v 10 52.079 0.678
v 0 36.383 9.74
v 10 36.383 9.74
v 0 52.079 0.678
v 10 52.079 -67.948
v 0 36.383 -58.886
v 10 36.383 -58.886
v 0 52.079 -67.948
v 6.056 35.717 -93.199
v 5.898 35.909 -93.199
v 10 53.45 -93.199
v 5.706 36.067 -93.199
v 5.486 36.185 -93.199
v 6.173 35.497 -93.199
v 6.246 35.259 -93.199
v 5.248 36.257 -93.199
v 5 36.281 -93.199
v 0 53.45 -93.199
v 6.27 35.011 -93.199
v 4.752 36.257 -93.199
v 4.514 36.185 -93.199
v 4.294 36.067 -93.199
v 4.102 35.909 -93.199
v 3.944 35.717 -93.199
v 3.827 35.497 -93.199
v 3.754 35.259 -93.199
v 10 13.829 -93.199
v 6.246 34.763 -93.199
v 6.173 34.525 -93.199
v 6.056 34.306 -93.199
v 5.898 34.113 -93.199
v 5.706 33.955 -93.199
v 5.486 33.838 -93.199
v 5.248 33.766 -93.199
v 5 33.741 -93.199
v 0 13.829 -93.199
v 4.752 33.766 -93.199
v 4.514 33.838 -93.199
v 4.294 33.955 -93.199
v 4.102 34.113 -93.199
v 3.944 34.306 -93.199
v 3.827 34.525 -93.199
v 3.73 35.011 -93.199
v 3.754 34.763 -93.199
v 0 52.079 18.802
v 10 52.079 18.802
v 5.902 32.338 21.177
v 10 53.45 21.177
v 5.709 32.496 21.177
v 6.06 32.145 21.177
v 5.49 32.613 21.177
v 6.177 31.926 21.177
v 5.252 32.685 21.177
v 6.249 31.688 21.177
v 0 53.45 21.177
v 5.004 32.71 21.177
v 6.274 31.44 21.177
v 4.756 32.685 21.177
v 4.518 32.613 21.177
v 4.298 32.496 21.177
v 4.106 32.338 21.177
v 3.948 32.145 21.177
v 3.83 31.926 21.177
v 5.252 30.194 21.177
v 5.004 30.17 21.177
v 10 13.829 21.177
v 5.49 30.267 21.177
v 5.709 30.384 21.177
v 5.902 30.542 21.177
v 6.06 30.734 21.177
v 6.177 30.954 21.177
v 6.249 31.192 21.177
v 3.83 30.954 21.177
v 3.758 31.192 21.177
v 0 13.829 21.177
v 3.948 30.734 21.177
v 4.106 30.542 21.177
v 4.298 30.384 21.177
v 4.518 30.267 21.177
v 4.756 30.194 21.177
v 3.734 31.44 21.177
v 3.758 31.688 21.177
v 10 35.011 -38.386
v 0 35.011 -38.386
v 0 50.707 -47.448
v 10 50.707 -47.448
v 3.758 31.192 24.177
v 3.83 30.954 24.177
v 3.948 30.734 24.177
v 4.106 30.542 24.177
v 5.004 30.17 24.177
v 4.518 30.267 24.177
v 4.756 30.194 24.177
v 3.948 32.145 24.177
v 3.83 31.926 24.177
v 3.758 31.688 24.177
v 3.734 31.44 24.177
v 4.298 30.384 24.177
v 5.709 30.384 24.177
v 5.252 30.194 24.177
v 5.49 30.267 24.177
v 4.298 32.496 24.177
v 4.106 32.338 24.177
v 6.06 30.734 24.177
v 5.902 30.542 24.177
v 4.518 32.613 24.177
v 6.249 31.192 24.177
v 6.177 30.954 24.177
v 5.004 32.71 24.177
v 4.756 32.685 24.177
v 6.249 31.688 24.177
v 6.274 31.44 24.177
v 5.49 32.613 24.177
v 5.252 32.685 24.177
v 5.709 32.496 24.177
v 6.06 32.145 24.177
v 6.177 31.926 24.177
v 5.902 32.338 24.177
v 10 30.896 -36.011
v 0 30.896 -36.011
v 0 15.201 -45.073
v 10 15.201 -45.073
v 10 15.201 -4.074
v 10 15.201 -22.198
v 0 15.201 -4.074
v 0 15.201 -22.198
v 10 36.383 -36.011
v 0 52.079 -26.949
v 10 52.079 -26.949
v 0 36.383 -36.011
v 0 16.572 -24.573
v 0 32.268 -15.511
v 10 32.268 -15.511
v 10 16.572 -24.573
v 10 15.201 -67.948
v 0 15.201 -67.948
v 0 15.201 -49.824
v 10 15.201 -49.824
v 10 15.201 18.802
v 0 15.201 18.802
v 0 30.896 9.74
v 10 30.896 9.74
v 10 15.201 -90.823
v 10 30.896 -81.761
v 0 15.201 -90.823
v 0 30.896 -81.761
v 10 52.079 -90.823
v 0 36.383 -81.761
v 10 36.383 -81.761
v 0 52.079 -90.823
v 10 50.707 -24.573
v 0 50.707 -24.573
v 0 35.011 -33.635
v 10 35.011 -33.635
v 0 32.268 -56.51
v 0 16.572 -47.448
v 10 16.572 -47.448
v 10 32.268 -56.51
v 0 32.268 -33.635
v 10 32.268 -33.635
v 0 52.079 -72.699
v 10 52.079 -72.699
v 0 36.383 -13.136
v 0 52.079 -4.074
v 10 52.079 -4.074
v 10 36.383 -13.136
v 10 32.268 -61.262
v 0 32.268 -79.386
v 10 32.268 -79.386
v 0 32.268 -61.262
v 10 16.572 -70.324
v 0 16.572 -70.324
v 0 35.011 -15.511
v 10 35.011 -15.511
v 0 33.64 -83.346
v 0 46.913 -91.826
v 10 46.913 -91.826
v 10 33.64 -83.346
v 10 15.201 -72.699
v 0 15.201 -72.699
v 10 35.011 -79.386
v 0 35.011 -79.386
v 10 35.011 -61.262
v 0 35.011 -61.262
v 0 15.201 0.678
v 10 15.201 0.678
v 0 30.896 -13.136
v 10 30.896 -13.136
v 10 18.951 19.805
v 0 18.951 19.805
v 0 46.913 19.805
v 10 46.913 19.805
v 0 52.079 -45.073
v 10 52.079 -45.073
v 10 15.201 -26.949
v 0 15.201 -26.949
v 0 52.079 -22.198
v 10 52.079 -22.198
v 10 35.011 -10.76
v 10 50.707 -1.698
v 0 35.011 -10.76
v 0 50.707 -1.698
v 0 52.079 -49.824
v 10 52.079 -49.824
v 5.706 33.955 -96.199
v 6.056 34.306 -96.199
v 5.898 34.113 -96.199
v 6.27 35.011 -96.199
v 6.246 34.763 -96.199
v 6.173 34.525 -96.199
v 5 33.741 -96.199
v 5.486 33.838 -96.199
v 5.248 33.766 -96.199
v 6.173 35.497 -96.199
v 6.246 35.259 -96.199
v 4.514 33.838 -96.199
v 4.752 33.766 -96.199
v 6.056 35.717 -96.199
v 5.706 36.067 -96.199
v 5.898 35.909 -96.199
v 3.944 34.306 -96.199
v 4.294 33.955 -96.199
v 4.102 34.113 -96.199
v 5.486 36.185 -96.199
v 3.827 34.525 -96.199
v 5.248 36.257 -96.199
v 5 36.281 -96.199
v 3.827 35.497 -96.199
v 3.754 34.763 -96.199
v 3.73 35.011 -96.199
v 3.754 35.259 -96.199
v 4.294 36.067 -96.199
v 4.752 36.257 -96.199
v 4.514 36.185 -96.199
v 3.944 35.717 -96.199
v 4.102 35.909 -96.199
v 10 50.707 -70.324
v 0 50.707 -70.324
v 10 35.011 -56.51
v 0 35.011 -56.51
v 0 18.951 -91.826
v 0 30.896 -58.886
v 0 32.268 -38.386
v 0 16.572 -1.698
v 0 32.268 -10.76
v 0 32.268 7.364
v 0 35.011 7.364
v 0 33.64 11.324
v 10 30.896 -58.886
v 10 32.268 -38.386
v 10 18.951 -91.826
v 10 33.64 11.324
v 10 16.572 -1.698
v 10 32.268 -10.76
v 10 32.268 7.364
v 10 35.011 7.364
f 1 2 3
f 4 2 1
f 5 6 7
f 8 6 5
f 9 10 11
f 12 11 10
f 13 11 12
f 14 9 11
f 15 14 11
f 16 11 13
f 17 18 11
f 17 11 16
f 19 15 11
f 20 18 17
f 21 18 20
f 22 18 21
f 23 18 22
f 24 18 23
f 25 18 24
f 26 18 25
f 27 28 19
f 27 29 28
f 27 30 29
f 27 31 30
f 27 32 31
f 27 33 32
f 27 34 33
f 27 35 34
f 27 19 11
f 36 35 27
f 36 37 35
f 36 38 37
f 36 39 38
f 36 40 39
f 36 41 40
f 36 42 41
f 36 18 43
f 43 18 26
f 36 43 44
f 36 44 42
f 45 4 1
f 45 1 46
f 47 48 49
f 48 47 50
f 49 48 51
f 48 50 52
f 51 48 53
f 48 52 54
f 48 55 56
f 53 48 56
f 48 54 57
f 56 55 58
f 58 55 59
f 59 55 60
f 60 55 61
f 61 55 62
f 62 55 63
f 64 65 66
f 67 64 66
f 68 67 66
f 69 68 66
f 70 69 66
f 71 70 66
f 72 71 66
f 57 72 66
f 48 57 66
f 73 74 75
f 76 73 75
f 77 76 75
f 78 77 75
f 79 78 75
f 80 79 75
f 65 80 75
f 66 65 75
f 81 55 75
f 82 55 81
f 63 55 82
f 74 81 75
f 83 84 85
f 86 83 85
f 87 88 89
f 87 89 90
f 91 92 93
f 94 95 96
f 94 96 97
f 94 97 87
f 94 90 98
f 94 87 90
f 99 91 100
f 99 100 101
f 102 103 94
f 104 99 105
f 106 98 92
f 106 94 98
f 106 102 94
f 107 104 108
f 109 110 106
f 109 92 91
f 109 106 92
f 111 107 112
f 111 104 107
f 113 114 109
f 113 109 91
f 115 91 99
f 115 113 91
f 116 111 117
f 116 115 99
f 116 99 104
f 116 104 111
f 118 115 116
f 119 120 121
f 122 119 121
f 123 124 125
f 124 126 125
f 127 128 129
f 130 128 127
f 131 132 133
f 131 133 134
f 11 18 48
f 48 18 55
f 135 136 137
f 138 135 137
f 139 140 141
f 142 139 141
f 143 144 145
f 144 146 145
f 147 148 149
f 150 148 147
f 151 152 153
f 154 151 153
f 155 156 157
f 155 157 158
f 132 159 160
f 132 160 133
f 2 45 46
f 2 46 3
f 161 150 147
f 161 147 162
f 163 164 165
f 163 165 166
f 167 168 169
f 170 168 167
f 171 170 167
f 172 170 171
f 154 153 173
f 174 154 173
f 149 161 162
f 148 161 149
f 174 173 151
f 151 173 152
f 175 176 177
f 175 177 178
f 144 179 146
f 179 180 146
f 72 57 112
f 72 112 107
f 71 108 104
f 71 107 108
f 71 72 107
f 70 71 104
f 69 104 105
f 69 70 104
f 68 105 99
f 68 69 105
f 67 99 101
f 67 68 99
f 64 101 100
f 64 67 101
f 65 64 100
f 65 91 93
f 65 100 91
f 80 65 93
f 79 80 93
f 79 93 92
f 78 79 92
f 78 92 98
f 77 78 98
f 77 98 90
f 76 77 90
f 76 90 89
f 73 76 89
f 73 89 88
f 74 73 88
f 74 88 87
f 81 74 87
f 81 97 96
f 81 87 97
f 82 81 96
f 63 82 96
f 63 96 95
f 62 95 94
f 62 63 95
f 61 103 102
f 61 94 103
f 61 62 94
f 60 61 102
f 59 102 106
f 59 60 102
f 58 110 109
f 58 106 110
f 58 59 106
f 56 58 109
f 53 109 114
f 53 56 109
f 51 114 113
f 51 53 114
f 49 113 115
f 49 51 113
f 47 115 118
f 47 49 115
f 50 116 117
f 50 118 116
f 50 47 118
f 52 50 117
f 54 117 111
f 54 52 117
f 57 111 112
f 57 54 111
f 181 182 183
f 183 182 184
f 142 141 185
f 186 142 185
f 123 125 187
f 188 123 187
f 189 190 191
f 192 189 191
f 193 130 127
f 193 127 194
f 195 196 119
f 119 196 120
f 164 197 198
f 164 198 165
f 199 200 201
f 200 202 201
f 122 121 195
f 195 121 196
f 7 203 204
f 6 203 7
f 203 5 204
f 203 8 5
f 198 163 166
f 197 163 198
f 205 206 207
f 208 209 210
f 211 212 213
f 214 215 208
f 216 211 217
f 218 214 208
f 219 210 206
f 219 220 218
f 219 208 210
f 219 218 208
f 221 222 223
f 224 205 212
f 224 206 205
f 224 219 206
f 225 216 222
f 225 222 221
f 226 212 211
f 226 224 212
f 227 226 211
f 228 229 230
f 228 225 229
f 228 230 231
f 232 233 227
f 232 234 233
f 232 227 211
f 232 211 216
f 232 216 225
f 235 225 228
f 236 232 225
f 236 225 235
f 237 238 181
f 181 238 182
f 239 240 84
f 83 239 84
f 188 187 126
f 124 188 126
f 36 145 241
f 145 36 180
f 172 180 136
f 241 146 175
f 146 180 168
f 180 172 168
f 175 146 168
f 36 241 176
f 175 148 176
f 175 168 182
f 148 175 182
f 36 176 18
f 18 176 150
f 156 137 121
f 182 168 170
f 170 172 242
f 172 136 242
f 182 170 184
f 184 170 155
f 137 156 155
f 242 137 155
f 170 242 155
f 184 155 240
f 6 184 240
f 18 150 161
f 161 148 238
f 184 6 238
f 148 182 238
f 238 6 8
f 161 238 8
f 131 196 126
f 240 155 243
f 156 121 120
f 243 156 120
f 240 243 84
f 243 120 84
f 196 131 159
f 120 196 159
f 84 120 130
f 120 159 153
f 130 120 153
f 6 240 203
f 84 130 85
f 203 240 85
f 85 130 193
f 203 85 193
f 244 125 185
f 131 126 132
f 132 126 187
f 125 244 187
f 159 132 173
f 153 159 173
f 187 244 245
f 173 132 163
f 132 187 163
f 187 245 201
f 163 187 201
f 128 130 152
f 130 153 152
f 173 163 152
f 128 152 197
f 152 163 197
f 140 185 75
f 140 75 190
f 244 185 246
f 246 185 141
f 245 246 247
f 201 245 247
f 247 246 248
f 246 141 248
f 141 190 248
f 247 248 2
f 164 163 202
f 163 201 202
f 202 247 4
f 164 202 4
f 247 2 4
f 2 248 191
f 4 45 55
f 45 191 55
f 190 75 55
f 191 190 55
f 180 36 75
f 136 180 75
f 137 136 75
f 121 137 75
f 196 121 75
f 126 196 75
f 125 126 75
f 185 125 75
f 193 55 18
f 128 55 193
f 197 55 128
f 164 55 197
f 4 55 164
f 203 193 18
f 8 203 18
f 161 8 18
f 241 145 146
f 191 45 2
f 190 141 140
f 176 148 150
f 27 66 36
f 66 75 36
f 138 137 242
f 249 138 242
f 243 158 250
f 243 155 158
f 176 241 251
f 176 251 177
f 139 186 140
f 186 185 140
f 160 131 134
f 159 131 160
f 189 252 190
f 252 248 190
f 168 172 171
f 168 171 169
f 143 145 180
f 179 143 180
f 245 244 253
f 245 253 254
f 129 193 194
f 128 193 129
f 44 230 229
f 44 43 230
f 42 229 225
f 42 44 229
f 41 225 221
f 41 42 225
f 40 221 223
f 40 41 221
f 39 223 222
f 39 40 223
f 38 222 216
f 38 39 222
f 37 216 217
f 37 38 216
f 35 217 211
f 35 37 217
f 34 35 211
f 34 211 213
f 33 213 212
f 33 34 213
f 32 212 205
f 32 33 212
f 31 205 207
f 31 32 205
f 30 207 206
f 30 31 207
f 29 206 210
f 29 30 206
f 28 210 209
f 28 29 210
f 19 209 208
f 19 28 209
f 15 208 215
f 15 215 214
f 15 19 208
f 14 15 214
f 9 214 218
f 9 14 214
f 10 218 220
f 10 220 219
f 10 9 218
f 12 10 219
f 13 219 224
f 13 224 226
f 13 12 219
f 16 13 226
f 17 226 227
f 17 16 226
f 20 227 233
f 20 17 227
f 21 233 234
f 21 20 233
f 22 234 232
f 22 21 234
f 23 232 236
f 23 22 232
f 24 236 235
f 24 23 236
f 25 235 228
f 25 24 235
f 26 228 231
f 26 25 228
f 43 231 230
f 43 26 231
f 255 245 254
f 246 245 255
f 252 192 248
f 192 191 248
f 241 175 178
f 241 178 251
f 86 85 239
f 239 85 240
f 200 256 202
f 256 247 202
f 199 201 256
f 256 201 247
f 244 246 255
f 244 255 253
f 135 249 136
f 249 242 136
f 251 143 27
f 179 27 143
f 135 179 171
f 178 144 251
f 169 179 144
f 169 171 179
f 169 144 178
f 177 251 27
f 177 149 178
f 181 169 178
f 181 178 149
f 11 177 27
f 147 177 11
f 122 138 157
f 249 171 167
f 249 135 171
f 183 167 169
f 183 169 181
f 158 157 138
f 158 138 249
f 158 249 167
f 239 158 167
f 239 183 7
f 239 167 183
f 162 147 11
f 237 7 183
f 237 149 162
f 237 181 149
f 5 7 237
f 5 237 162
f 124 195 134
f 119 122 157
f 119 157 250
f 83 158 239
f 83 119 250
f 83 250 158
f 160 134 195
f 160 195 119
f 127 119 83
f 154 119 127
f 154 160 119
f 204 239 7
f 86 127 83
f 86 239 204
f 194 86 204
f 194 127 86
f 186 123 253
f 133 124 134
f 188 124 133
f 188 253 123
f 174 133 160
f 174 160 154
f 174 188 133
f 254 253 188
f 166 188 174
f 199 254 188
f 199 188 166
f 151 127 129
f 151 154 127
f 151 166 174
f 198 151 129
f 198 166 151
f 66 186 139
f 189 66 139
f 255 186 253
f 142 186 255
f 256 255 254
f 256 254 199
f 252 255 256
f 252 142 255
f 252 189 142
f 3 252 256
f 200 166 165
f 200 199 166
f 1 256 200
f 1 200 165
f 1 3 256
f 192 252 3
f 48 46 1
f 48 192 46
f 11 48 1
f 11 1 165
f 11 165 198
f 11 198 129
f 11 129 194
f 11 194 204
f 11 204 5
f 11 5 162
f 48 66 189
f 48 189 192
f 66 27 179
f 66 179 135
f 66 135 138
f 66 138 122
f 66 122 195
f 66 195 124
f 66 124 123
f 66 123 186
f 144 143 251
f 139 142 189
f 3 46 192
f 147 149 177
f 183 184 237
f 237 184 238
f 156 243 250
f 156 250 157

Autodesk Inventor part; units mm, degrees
ref_plane "YZ Plane" through (0, 0, 0) normal (1, 0, 0) x (0, 1, 0)
ref_plane "XZ Plane" through (0, 0, 0) normal (0, 1, 0) x (-1, 0, 0)
ref_plane "XY Plane" through (0, 0, 0) normal (0, 0, 1) x (1, 0, 0)
sketch "Sketch1" plane through (0, 0, 0) normal (1, 0, 0) x (0, 1, 0)
  line L0 (33.6396, 9.7397) -> (33.6396, -13.1356)
  line L1 (33.6396, -13.1356) -> (53.4502, -1.698)
  line L2 (53.4502, -1.698) -> (33.6396, 9.7397)
  line L3 (50.707, -1.698) -> (35.0112, -10.7599)
  line L4 (35.0112, -10.7599) -> (35.0112, 7.364)
  line L5 (35.0112, 7.364) -> (50.707, -1.698)
  line L6 (53.4502, -1.698) -> (33.6396, -13.1356)
  line L7 (53.4502, -24.5732) -> (33.6396, -13.1356)
  line L8 (53.4502, -1.698) -> (53.4502, -24.5732)
  line L9 (52.0786, -4.0736) -> (36.3828, -13.1356)
  line L10 (36.3828, -13.1356) -> (52.0786, -22.1975)
  line L11 (52.0786, -22.1975) -> (52.0786, -4.0736)
  line L12 (33.6396, -13.1356) -> (33.6396, -36.0108)
  line L13 (33.6396, -36.0108) -> (53.4502, -24.5732)
  line L14 (35.0112, -33.6351) -> (35.0112, -15.5113)
  line L15 (35.0112, -15.5113) -> (50.707, -24.5732)
  line L16 (50.707, -24.5732) -> (35.0112, -33.6351)
  line L17 (53.4502, -24.5732) -> (53.4502, -47.4484)
  line L18 (53.4502, -47.4484) -> (33.6396, -36.0108)
  line L19 (52.0786, -45.0728) -> (52.0786, -26.9489)
  line L20 (36.3828, -36.0108) -> (52.0786, -45.0728)
  line L21 (52.0786, -26.9489) -> (36.3828, -36.0108)
  line L22 (33.6396, -36.0108) -> (33.6396, -58.8861)
  line L23 (35.0112, -56.5104) -> (35.0112, -38.3865)
  line L24 (33.6396, -58.8861) -> (53.4502, -47.4484)
  line L25 (50.707, -47.4484) -> (35.0112, -56.5104)
  line L26 (35.0112, -38.3865) -> (50.707, -47.4484)
  line L27 (53.4502, -47.4484) -> (53.4502, -70.3237)
  line L28 (52.0786, -49.8241) -> (36.3828, -58.8861)
  line L29 (36.3828, -58.8861) -> (52.0786, -67.948)
  line L30 (53.4502, -70.3237) -> (33.6396, -58.8861)
  line L31 (52.0786, -67.948) -> (52.0786, -49.8241)
  line L32 (33.6396, -58.8861) -> (33.6396, -81.7613)
  line L33 (33.6396, -81.7613) -> (53.4502, -70.3237)
  line L34 (50.707, -70.3237) -> (35.0112, -79.3856)
  line L35 (35.0112, -79.3856) -> (35.0112, -61.2617)
  line L36 (35.0112, -61.2617) -> (50.707, -70.3237)
  line L37 (33.6396, -13.1356) -> (13.8291, -1.698)
  line L38 (13.8291, -1.698) -> (33.6396, 9.7397)
  line L39 (16.5723, -1.698) -> (32.268, -10.7599)
  line L40 (32.268, -10.7599) -> (32.268, 7.364)
  line L41 (32.268, 7.364) -> (16.5723, -1.698)
  line L42 (33.6396, -13.1356) -> (13.8291, -1.698)
  line L43 (13.8291, -24.5732) -> (33.6396, -13.1356)
  line L44 (13.8291, -1.698) -> (13.8291, -24.5732)
  line L45 (15.2007, -4.0736) -> (30.8964, -13.1356)
  line L46 (30.8964, -13.1356) -> (15.2007, -22.1975)
  line L47 (15.2007, -22.1975) -> (15.2007, -4.0736)
  line L48 (13.8291, -24.5732) -> (33.6396, -13.1356)
  line L49 (33.6396, -36.0108) -> (13.8291, -24.5732)
  line L50 (32.268, -15.5113) -> (16.5723, -24.5732)
  line L51 (32.268, -33.6351) -> (32.268, -15.5113)
  line L52 (16.5723, -24.5732) -> (32.268, -33.6351)
  line L53 (13.8291, -47.4484) -> (33.6396, -36.0108)
  line L54 (16.5723, -47.4484) -> (32.268, -56.5104)
  line L55 (32.268, -56.5104) -> (32.268, -38.3865)
  line L56 (33.6396, -58.8861) -> (13.8291, -47.4484)
  line L57 (32.268, -38.3865) -> (16.5723, -47.4484)
  line L58 (33.6396, -36.0108) -> (13.8291, -24.5732)
  line L59 (15.2007, -26.9489) -> (30.8964, -36.0108)
  line L60 (13.8291, -24.5732) -> (13.8291, -47.4484)
  line L61 (15.2007, -45.0728) -> (15.2007, -26.9489)
  line L62 (13.8291, -47.4484) -> (33.6396, -36.0108)
  line L63 (30.8964, -36.0108) -> (15.2007, -45.0728)
  line L64 (13.8291, -70.3237) -> (33.6396, -58.8861)
  line L65 (32.268, -79.3856) -> (32.268, -61.2617)
  line L66 (33.6396, -81.7613) -> (13.8291, -70.3237)
  line L67 (32.268, -61.2617) -> (16.5723, -70.3237)
  line L68 (16.5723, -70.3237) -> (32.268, -79.3856)
  line L69 (33.6396, -58.8861) -> (13.8291, -47.4484)
  line L70 (13.8291, -47.4484) -> (13.8291, -70.3237)
  line L71 (15.2007, -67.948) -> (15.2007, -49.8241)
  line L72 (15.2007, -49.8241) -> (30.8964, -58.8861)
  line L73 (13.8291, -70.3237) -> (33.6396, -58.8861)
  line L74 (30.8964, -58.8861) -> (15.2007, -67.948)
  line L75 (13.8291, -1.698) -> (13.8291, 21.1773)
  line L76 (13.8291, 21.1773) -> (33.6396, 9.7397)
  line L77 (53.4502, -1.698) -> (53.4502, 21.1773)
  line L78 (53.4502, 21.1773) -> (33.6396, 9.7397)
  line L79 (53.4502, 21.1773) -> (13.8291, 21.1773)
  line L80 (53.4502, -70.3237) -> (53.4502, -93.1989)
  line L81 (53.4502, -93.1989) -> (33.6396, -81.7613)
  line L82 (13.8291, -70.3237) -> (13.8291, -93.1989)
  line L83 (13.8291, -93.1989) -> (33.6396, -81.7613)
  line L84 (53.4502, -93.1989) -> (13.8291, -93.1989)
  line L85 (15.2007, 0.6777) -> (15.2007, 18.8016)
  line L86 (30.8964, 9.7397) -> (15.2007, 0.6777)
  line L87 (15.2007, 18.8016) -> (30.8964, 9.7397)
  line L88 (52.0786, 0.6777) -> (52.0786, 18.8016)
  line L89 (52.0786, 18.8016) -> (36.3828, 9.7397)
  line L90 (36.3828, 9.7397) -> (52.0786, 0.6777)
  line L91 (36.3828, -81.7613) -> (52.0786, -90.8232)
  line L92 (52.0786, -90.8232) -> (52.0786, -72.6994)
  line L93 (52.0786, -72.6994) -> (36.3828, -81.7613)
  line L94 (30.8964, -81.7613) -> (15.2007, -90.8232)
  line L95 (15.2007, -90.8232) -> (15.2007, -72.6994)
  line L96 (15.2007, -72.6994) -> (30.8964, -81.7613)
  line L97 (35.8485, 19.8048) -> (46.9126, 19.8048)
  line L98 (46.9126, 19.8048) -> (33.6396, 11.3245)
  line L99 (33.6396, 11.3245) -> (18.9514, 19.8048)
  line L100 (18.9514, 19.8048) -> (35.8485, 19.8048)
  line L101 (35.8485, -91.8264) -> (46.9126, -91.8264)
  line L102 (46.9126, -91.8264) -> (33.6396, -83.3461)
  line L103 (33.6396, -83.3461) -> (18.9514, -91.8264)
  line L104 (18.9514, -91.8264) -> (35.8485, -91.8264)
  dimension "d13" = 1.3716
extrude "Extrusion1" add sketch "Sketch1" along normal blind 10
sketch "Sketch2" plane through (0, 13.8291, 21.1773) normal (0, 0, 1) x (1, 0, 0)
  line L0 (0, 39.6211) -> (10, 39.6211) projected
  circle A0 centre (5.0038, 17.6108) radius 1.27
  point P0 (0, -13.8291)
  point P1 (0, 19.8105)
extrude "Extrusion2" add sketch "Sketch2" along normal blind 3
sketch "Sketch3" plane through (0, 13.8291, -93.1989) normal (0, 0, -1) x (-1, 0, 0)
  line L0 (0, 39.6211) -> (-10, 39.6211) projected
  line L1 (0, 21.1821) -> (-10, 21.1821) projected
  circle A0 centre (-5, 21.1821) radius 1.27
  point P0 (0, -13.8291)
  dimension "d36" = 2.54
extrude "Extrusion3" add sketch "Sketch3" along normal blind 3
properties part number "Arm support for middle arms"
